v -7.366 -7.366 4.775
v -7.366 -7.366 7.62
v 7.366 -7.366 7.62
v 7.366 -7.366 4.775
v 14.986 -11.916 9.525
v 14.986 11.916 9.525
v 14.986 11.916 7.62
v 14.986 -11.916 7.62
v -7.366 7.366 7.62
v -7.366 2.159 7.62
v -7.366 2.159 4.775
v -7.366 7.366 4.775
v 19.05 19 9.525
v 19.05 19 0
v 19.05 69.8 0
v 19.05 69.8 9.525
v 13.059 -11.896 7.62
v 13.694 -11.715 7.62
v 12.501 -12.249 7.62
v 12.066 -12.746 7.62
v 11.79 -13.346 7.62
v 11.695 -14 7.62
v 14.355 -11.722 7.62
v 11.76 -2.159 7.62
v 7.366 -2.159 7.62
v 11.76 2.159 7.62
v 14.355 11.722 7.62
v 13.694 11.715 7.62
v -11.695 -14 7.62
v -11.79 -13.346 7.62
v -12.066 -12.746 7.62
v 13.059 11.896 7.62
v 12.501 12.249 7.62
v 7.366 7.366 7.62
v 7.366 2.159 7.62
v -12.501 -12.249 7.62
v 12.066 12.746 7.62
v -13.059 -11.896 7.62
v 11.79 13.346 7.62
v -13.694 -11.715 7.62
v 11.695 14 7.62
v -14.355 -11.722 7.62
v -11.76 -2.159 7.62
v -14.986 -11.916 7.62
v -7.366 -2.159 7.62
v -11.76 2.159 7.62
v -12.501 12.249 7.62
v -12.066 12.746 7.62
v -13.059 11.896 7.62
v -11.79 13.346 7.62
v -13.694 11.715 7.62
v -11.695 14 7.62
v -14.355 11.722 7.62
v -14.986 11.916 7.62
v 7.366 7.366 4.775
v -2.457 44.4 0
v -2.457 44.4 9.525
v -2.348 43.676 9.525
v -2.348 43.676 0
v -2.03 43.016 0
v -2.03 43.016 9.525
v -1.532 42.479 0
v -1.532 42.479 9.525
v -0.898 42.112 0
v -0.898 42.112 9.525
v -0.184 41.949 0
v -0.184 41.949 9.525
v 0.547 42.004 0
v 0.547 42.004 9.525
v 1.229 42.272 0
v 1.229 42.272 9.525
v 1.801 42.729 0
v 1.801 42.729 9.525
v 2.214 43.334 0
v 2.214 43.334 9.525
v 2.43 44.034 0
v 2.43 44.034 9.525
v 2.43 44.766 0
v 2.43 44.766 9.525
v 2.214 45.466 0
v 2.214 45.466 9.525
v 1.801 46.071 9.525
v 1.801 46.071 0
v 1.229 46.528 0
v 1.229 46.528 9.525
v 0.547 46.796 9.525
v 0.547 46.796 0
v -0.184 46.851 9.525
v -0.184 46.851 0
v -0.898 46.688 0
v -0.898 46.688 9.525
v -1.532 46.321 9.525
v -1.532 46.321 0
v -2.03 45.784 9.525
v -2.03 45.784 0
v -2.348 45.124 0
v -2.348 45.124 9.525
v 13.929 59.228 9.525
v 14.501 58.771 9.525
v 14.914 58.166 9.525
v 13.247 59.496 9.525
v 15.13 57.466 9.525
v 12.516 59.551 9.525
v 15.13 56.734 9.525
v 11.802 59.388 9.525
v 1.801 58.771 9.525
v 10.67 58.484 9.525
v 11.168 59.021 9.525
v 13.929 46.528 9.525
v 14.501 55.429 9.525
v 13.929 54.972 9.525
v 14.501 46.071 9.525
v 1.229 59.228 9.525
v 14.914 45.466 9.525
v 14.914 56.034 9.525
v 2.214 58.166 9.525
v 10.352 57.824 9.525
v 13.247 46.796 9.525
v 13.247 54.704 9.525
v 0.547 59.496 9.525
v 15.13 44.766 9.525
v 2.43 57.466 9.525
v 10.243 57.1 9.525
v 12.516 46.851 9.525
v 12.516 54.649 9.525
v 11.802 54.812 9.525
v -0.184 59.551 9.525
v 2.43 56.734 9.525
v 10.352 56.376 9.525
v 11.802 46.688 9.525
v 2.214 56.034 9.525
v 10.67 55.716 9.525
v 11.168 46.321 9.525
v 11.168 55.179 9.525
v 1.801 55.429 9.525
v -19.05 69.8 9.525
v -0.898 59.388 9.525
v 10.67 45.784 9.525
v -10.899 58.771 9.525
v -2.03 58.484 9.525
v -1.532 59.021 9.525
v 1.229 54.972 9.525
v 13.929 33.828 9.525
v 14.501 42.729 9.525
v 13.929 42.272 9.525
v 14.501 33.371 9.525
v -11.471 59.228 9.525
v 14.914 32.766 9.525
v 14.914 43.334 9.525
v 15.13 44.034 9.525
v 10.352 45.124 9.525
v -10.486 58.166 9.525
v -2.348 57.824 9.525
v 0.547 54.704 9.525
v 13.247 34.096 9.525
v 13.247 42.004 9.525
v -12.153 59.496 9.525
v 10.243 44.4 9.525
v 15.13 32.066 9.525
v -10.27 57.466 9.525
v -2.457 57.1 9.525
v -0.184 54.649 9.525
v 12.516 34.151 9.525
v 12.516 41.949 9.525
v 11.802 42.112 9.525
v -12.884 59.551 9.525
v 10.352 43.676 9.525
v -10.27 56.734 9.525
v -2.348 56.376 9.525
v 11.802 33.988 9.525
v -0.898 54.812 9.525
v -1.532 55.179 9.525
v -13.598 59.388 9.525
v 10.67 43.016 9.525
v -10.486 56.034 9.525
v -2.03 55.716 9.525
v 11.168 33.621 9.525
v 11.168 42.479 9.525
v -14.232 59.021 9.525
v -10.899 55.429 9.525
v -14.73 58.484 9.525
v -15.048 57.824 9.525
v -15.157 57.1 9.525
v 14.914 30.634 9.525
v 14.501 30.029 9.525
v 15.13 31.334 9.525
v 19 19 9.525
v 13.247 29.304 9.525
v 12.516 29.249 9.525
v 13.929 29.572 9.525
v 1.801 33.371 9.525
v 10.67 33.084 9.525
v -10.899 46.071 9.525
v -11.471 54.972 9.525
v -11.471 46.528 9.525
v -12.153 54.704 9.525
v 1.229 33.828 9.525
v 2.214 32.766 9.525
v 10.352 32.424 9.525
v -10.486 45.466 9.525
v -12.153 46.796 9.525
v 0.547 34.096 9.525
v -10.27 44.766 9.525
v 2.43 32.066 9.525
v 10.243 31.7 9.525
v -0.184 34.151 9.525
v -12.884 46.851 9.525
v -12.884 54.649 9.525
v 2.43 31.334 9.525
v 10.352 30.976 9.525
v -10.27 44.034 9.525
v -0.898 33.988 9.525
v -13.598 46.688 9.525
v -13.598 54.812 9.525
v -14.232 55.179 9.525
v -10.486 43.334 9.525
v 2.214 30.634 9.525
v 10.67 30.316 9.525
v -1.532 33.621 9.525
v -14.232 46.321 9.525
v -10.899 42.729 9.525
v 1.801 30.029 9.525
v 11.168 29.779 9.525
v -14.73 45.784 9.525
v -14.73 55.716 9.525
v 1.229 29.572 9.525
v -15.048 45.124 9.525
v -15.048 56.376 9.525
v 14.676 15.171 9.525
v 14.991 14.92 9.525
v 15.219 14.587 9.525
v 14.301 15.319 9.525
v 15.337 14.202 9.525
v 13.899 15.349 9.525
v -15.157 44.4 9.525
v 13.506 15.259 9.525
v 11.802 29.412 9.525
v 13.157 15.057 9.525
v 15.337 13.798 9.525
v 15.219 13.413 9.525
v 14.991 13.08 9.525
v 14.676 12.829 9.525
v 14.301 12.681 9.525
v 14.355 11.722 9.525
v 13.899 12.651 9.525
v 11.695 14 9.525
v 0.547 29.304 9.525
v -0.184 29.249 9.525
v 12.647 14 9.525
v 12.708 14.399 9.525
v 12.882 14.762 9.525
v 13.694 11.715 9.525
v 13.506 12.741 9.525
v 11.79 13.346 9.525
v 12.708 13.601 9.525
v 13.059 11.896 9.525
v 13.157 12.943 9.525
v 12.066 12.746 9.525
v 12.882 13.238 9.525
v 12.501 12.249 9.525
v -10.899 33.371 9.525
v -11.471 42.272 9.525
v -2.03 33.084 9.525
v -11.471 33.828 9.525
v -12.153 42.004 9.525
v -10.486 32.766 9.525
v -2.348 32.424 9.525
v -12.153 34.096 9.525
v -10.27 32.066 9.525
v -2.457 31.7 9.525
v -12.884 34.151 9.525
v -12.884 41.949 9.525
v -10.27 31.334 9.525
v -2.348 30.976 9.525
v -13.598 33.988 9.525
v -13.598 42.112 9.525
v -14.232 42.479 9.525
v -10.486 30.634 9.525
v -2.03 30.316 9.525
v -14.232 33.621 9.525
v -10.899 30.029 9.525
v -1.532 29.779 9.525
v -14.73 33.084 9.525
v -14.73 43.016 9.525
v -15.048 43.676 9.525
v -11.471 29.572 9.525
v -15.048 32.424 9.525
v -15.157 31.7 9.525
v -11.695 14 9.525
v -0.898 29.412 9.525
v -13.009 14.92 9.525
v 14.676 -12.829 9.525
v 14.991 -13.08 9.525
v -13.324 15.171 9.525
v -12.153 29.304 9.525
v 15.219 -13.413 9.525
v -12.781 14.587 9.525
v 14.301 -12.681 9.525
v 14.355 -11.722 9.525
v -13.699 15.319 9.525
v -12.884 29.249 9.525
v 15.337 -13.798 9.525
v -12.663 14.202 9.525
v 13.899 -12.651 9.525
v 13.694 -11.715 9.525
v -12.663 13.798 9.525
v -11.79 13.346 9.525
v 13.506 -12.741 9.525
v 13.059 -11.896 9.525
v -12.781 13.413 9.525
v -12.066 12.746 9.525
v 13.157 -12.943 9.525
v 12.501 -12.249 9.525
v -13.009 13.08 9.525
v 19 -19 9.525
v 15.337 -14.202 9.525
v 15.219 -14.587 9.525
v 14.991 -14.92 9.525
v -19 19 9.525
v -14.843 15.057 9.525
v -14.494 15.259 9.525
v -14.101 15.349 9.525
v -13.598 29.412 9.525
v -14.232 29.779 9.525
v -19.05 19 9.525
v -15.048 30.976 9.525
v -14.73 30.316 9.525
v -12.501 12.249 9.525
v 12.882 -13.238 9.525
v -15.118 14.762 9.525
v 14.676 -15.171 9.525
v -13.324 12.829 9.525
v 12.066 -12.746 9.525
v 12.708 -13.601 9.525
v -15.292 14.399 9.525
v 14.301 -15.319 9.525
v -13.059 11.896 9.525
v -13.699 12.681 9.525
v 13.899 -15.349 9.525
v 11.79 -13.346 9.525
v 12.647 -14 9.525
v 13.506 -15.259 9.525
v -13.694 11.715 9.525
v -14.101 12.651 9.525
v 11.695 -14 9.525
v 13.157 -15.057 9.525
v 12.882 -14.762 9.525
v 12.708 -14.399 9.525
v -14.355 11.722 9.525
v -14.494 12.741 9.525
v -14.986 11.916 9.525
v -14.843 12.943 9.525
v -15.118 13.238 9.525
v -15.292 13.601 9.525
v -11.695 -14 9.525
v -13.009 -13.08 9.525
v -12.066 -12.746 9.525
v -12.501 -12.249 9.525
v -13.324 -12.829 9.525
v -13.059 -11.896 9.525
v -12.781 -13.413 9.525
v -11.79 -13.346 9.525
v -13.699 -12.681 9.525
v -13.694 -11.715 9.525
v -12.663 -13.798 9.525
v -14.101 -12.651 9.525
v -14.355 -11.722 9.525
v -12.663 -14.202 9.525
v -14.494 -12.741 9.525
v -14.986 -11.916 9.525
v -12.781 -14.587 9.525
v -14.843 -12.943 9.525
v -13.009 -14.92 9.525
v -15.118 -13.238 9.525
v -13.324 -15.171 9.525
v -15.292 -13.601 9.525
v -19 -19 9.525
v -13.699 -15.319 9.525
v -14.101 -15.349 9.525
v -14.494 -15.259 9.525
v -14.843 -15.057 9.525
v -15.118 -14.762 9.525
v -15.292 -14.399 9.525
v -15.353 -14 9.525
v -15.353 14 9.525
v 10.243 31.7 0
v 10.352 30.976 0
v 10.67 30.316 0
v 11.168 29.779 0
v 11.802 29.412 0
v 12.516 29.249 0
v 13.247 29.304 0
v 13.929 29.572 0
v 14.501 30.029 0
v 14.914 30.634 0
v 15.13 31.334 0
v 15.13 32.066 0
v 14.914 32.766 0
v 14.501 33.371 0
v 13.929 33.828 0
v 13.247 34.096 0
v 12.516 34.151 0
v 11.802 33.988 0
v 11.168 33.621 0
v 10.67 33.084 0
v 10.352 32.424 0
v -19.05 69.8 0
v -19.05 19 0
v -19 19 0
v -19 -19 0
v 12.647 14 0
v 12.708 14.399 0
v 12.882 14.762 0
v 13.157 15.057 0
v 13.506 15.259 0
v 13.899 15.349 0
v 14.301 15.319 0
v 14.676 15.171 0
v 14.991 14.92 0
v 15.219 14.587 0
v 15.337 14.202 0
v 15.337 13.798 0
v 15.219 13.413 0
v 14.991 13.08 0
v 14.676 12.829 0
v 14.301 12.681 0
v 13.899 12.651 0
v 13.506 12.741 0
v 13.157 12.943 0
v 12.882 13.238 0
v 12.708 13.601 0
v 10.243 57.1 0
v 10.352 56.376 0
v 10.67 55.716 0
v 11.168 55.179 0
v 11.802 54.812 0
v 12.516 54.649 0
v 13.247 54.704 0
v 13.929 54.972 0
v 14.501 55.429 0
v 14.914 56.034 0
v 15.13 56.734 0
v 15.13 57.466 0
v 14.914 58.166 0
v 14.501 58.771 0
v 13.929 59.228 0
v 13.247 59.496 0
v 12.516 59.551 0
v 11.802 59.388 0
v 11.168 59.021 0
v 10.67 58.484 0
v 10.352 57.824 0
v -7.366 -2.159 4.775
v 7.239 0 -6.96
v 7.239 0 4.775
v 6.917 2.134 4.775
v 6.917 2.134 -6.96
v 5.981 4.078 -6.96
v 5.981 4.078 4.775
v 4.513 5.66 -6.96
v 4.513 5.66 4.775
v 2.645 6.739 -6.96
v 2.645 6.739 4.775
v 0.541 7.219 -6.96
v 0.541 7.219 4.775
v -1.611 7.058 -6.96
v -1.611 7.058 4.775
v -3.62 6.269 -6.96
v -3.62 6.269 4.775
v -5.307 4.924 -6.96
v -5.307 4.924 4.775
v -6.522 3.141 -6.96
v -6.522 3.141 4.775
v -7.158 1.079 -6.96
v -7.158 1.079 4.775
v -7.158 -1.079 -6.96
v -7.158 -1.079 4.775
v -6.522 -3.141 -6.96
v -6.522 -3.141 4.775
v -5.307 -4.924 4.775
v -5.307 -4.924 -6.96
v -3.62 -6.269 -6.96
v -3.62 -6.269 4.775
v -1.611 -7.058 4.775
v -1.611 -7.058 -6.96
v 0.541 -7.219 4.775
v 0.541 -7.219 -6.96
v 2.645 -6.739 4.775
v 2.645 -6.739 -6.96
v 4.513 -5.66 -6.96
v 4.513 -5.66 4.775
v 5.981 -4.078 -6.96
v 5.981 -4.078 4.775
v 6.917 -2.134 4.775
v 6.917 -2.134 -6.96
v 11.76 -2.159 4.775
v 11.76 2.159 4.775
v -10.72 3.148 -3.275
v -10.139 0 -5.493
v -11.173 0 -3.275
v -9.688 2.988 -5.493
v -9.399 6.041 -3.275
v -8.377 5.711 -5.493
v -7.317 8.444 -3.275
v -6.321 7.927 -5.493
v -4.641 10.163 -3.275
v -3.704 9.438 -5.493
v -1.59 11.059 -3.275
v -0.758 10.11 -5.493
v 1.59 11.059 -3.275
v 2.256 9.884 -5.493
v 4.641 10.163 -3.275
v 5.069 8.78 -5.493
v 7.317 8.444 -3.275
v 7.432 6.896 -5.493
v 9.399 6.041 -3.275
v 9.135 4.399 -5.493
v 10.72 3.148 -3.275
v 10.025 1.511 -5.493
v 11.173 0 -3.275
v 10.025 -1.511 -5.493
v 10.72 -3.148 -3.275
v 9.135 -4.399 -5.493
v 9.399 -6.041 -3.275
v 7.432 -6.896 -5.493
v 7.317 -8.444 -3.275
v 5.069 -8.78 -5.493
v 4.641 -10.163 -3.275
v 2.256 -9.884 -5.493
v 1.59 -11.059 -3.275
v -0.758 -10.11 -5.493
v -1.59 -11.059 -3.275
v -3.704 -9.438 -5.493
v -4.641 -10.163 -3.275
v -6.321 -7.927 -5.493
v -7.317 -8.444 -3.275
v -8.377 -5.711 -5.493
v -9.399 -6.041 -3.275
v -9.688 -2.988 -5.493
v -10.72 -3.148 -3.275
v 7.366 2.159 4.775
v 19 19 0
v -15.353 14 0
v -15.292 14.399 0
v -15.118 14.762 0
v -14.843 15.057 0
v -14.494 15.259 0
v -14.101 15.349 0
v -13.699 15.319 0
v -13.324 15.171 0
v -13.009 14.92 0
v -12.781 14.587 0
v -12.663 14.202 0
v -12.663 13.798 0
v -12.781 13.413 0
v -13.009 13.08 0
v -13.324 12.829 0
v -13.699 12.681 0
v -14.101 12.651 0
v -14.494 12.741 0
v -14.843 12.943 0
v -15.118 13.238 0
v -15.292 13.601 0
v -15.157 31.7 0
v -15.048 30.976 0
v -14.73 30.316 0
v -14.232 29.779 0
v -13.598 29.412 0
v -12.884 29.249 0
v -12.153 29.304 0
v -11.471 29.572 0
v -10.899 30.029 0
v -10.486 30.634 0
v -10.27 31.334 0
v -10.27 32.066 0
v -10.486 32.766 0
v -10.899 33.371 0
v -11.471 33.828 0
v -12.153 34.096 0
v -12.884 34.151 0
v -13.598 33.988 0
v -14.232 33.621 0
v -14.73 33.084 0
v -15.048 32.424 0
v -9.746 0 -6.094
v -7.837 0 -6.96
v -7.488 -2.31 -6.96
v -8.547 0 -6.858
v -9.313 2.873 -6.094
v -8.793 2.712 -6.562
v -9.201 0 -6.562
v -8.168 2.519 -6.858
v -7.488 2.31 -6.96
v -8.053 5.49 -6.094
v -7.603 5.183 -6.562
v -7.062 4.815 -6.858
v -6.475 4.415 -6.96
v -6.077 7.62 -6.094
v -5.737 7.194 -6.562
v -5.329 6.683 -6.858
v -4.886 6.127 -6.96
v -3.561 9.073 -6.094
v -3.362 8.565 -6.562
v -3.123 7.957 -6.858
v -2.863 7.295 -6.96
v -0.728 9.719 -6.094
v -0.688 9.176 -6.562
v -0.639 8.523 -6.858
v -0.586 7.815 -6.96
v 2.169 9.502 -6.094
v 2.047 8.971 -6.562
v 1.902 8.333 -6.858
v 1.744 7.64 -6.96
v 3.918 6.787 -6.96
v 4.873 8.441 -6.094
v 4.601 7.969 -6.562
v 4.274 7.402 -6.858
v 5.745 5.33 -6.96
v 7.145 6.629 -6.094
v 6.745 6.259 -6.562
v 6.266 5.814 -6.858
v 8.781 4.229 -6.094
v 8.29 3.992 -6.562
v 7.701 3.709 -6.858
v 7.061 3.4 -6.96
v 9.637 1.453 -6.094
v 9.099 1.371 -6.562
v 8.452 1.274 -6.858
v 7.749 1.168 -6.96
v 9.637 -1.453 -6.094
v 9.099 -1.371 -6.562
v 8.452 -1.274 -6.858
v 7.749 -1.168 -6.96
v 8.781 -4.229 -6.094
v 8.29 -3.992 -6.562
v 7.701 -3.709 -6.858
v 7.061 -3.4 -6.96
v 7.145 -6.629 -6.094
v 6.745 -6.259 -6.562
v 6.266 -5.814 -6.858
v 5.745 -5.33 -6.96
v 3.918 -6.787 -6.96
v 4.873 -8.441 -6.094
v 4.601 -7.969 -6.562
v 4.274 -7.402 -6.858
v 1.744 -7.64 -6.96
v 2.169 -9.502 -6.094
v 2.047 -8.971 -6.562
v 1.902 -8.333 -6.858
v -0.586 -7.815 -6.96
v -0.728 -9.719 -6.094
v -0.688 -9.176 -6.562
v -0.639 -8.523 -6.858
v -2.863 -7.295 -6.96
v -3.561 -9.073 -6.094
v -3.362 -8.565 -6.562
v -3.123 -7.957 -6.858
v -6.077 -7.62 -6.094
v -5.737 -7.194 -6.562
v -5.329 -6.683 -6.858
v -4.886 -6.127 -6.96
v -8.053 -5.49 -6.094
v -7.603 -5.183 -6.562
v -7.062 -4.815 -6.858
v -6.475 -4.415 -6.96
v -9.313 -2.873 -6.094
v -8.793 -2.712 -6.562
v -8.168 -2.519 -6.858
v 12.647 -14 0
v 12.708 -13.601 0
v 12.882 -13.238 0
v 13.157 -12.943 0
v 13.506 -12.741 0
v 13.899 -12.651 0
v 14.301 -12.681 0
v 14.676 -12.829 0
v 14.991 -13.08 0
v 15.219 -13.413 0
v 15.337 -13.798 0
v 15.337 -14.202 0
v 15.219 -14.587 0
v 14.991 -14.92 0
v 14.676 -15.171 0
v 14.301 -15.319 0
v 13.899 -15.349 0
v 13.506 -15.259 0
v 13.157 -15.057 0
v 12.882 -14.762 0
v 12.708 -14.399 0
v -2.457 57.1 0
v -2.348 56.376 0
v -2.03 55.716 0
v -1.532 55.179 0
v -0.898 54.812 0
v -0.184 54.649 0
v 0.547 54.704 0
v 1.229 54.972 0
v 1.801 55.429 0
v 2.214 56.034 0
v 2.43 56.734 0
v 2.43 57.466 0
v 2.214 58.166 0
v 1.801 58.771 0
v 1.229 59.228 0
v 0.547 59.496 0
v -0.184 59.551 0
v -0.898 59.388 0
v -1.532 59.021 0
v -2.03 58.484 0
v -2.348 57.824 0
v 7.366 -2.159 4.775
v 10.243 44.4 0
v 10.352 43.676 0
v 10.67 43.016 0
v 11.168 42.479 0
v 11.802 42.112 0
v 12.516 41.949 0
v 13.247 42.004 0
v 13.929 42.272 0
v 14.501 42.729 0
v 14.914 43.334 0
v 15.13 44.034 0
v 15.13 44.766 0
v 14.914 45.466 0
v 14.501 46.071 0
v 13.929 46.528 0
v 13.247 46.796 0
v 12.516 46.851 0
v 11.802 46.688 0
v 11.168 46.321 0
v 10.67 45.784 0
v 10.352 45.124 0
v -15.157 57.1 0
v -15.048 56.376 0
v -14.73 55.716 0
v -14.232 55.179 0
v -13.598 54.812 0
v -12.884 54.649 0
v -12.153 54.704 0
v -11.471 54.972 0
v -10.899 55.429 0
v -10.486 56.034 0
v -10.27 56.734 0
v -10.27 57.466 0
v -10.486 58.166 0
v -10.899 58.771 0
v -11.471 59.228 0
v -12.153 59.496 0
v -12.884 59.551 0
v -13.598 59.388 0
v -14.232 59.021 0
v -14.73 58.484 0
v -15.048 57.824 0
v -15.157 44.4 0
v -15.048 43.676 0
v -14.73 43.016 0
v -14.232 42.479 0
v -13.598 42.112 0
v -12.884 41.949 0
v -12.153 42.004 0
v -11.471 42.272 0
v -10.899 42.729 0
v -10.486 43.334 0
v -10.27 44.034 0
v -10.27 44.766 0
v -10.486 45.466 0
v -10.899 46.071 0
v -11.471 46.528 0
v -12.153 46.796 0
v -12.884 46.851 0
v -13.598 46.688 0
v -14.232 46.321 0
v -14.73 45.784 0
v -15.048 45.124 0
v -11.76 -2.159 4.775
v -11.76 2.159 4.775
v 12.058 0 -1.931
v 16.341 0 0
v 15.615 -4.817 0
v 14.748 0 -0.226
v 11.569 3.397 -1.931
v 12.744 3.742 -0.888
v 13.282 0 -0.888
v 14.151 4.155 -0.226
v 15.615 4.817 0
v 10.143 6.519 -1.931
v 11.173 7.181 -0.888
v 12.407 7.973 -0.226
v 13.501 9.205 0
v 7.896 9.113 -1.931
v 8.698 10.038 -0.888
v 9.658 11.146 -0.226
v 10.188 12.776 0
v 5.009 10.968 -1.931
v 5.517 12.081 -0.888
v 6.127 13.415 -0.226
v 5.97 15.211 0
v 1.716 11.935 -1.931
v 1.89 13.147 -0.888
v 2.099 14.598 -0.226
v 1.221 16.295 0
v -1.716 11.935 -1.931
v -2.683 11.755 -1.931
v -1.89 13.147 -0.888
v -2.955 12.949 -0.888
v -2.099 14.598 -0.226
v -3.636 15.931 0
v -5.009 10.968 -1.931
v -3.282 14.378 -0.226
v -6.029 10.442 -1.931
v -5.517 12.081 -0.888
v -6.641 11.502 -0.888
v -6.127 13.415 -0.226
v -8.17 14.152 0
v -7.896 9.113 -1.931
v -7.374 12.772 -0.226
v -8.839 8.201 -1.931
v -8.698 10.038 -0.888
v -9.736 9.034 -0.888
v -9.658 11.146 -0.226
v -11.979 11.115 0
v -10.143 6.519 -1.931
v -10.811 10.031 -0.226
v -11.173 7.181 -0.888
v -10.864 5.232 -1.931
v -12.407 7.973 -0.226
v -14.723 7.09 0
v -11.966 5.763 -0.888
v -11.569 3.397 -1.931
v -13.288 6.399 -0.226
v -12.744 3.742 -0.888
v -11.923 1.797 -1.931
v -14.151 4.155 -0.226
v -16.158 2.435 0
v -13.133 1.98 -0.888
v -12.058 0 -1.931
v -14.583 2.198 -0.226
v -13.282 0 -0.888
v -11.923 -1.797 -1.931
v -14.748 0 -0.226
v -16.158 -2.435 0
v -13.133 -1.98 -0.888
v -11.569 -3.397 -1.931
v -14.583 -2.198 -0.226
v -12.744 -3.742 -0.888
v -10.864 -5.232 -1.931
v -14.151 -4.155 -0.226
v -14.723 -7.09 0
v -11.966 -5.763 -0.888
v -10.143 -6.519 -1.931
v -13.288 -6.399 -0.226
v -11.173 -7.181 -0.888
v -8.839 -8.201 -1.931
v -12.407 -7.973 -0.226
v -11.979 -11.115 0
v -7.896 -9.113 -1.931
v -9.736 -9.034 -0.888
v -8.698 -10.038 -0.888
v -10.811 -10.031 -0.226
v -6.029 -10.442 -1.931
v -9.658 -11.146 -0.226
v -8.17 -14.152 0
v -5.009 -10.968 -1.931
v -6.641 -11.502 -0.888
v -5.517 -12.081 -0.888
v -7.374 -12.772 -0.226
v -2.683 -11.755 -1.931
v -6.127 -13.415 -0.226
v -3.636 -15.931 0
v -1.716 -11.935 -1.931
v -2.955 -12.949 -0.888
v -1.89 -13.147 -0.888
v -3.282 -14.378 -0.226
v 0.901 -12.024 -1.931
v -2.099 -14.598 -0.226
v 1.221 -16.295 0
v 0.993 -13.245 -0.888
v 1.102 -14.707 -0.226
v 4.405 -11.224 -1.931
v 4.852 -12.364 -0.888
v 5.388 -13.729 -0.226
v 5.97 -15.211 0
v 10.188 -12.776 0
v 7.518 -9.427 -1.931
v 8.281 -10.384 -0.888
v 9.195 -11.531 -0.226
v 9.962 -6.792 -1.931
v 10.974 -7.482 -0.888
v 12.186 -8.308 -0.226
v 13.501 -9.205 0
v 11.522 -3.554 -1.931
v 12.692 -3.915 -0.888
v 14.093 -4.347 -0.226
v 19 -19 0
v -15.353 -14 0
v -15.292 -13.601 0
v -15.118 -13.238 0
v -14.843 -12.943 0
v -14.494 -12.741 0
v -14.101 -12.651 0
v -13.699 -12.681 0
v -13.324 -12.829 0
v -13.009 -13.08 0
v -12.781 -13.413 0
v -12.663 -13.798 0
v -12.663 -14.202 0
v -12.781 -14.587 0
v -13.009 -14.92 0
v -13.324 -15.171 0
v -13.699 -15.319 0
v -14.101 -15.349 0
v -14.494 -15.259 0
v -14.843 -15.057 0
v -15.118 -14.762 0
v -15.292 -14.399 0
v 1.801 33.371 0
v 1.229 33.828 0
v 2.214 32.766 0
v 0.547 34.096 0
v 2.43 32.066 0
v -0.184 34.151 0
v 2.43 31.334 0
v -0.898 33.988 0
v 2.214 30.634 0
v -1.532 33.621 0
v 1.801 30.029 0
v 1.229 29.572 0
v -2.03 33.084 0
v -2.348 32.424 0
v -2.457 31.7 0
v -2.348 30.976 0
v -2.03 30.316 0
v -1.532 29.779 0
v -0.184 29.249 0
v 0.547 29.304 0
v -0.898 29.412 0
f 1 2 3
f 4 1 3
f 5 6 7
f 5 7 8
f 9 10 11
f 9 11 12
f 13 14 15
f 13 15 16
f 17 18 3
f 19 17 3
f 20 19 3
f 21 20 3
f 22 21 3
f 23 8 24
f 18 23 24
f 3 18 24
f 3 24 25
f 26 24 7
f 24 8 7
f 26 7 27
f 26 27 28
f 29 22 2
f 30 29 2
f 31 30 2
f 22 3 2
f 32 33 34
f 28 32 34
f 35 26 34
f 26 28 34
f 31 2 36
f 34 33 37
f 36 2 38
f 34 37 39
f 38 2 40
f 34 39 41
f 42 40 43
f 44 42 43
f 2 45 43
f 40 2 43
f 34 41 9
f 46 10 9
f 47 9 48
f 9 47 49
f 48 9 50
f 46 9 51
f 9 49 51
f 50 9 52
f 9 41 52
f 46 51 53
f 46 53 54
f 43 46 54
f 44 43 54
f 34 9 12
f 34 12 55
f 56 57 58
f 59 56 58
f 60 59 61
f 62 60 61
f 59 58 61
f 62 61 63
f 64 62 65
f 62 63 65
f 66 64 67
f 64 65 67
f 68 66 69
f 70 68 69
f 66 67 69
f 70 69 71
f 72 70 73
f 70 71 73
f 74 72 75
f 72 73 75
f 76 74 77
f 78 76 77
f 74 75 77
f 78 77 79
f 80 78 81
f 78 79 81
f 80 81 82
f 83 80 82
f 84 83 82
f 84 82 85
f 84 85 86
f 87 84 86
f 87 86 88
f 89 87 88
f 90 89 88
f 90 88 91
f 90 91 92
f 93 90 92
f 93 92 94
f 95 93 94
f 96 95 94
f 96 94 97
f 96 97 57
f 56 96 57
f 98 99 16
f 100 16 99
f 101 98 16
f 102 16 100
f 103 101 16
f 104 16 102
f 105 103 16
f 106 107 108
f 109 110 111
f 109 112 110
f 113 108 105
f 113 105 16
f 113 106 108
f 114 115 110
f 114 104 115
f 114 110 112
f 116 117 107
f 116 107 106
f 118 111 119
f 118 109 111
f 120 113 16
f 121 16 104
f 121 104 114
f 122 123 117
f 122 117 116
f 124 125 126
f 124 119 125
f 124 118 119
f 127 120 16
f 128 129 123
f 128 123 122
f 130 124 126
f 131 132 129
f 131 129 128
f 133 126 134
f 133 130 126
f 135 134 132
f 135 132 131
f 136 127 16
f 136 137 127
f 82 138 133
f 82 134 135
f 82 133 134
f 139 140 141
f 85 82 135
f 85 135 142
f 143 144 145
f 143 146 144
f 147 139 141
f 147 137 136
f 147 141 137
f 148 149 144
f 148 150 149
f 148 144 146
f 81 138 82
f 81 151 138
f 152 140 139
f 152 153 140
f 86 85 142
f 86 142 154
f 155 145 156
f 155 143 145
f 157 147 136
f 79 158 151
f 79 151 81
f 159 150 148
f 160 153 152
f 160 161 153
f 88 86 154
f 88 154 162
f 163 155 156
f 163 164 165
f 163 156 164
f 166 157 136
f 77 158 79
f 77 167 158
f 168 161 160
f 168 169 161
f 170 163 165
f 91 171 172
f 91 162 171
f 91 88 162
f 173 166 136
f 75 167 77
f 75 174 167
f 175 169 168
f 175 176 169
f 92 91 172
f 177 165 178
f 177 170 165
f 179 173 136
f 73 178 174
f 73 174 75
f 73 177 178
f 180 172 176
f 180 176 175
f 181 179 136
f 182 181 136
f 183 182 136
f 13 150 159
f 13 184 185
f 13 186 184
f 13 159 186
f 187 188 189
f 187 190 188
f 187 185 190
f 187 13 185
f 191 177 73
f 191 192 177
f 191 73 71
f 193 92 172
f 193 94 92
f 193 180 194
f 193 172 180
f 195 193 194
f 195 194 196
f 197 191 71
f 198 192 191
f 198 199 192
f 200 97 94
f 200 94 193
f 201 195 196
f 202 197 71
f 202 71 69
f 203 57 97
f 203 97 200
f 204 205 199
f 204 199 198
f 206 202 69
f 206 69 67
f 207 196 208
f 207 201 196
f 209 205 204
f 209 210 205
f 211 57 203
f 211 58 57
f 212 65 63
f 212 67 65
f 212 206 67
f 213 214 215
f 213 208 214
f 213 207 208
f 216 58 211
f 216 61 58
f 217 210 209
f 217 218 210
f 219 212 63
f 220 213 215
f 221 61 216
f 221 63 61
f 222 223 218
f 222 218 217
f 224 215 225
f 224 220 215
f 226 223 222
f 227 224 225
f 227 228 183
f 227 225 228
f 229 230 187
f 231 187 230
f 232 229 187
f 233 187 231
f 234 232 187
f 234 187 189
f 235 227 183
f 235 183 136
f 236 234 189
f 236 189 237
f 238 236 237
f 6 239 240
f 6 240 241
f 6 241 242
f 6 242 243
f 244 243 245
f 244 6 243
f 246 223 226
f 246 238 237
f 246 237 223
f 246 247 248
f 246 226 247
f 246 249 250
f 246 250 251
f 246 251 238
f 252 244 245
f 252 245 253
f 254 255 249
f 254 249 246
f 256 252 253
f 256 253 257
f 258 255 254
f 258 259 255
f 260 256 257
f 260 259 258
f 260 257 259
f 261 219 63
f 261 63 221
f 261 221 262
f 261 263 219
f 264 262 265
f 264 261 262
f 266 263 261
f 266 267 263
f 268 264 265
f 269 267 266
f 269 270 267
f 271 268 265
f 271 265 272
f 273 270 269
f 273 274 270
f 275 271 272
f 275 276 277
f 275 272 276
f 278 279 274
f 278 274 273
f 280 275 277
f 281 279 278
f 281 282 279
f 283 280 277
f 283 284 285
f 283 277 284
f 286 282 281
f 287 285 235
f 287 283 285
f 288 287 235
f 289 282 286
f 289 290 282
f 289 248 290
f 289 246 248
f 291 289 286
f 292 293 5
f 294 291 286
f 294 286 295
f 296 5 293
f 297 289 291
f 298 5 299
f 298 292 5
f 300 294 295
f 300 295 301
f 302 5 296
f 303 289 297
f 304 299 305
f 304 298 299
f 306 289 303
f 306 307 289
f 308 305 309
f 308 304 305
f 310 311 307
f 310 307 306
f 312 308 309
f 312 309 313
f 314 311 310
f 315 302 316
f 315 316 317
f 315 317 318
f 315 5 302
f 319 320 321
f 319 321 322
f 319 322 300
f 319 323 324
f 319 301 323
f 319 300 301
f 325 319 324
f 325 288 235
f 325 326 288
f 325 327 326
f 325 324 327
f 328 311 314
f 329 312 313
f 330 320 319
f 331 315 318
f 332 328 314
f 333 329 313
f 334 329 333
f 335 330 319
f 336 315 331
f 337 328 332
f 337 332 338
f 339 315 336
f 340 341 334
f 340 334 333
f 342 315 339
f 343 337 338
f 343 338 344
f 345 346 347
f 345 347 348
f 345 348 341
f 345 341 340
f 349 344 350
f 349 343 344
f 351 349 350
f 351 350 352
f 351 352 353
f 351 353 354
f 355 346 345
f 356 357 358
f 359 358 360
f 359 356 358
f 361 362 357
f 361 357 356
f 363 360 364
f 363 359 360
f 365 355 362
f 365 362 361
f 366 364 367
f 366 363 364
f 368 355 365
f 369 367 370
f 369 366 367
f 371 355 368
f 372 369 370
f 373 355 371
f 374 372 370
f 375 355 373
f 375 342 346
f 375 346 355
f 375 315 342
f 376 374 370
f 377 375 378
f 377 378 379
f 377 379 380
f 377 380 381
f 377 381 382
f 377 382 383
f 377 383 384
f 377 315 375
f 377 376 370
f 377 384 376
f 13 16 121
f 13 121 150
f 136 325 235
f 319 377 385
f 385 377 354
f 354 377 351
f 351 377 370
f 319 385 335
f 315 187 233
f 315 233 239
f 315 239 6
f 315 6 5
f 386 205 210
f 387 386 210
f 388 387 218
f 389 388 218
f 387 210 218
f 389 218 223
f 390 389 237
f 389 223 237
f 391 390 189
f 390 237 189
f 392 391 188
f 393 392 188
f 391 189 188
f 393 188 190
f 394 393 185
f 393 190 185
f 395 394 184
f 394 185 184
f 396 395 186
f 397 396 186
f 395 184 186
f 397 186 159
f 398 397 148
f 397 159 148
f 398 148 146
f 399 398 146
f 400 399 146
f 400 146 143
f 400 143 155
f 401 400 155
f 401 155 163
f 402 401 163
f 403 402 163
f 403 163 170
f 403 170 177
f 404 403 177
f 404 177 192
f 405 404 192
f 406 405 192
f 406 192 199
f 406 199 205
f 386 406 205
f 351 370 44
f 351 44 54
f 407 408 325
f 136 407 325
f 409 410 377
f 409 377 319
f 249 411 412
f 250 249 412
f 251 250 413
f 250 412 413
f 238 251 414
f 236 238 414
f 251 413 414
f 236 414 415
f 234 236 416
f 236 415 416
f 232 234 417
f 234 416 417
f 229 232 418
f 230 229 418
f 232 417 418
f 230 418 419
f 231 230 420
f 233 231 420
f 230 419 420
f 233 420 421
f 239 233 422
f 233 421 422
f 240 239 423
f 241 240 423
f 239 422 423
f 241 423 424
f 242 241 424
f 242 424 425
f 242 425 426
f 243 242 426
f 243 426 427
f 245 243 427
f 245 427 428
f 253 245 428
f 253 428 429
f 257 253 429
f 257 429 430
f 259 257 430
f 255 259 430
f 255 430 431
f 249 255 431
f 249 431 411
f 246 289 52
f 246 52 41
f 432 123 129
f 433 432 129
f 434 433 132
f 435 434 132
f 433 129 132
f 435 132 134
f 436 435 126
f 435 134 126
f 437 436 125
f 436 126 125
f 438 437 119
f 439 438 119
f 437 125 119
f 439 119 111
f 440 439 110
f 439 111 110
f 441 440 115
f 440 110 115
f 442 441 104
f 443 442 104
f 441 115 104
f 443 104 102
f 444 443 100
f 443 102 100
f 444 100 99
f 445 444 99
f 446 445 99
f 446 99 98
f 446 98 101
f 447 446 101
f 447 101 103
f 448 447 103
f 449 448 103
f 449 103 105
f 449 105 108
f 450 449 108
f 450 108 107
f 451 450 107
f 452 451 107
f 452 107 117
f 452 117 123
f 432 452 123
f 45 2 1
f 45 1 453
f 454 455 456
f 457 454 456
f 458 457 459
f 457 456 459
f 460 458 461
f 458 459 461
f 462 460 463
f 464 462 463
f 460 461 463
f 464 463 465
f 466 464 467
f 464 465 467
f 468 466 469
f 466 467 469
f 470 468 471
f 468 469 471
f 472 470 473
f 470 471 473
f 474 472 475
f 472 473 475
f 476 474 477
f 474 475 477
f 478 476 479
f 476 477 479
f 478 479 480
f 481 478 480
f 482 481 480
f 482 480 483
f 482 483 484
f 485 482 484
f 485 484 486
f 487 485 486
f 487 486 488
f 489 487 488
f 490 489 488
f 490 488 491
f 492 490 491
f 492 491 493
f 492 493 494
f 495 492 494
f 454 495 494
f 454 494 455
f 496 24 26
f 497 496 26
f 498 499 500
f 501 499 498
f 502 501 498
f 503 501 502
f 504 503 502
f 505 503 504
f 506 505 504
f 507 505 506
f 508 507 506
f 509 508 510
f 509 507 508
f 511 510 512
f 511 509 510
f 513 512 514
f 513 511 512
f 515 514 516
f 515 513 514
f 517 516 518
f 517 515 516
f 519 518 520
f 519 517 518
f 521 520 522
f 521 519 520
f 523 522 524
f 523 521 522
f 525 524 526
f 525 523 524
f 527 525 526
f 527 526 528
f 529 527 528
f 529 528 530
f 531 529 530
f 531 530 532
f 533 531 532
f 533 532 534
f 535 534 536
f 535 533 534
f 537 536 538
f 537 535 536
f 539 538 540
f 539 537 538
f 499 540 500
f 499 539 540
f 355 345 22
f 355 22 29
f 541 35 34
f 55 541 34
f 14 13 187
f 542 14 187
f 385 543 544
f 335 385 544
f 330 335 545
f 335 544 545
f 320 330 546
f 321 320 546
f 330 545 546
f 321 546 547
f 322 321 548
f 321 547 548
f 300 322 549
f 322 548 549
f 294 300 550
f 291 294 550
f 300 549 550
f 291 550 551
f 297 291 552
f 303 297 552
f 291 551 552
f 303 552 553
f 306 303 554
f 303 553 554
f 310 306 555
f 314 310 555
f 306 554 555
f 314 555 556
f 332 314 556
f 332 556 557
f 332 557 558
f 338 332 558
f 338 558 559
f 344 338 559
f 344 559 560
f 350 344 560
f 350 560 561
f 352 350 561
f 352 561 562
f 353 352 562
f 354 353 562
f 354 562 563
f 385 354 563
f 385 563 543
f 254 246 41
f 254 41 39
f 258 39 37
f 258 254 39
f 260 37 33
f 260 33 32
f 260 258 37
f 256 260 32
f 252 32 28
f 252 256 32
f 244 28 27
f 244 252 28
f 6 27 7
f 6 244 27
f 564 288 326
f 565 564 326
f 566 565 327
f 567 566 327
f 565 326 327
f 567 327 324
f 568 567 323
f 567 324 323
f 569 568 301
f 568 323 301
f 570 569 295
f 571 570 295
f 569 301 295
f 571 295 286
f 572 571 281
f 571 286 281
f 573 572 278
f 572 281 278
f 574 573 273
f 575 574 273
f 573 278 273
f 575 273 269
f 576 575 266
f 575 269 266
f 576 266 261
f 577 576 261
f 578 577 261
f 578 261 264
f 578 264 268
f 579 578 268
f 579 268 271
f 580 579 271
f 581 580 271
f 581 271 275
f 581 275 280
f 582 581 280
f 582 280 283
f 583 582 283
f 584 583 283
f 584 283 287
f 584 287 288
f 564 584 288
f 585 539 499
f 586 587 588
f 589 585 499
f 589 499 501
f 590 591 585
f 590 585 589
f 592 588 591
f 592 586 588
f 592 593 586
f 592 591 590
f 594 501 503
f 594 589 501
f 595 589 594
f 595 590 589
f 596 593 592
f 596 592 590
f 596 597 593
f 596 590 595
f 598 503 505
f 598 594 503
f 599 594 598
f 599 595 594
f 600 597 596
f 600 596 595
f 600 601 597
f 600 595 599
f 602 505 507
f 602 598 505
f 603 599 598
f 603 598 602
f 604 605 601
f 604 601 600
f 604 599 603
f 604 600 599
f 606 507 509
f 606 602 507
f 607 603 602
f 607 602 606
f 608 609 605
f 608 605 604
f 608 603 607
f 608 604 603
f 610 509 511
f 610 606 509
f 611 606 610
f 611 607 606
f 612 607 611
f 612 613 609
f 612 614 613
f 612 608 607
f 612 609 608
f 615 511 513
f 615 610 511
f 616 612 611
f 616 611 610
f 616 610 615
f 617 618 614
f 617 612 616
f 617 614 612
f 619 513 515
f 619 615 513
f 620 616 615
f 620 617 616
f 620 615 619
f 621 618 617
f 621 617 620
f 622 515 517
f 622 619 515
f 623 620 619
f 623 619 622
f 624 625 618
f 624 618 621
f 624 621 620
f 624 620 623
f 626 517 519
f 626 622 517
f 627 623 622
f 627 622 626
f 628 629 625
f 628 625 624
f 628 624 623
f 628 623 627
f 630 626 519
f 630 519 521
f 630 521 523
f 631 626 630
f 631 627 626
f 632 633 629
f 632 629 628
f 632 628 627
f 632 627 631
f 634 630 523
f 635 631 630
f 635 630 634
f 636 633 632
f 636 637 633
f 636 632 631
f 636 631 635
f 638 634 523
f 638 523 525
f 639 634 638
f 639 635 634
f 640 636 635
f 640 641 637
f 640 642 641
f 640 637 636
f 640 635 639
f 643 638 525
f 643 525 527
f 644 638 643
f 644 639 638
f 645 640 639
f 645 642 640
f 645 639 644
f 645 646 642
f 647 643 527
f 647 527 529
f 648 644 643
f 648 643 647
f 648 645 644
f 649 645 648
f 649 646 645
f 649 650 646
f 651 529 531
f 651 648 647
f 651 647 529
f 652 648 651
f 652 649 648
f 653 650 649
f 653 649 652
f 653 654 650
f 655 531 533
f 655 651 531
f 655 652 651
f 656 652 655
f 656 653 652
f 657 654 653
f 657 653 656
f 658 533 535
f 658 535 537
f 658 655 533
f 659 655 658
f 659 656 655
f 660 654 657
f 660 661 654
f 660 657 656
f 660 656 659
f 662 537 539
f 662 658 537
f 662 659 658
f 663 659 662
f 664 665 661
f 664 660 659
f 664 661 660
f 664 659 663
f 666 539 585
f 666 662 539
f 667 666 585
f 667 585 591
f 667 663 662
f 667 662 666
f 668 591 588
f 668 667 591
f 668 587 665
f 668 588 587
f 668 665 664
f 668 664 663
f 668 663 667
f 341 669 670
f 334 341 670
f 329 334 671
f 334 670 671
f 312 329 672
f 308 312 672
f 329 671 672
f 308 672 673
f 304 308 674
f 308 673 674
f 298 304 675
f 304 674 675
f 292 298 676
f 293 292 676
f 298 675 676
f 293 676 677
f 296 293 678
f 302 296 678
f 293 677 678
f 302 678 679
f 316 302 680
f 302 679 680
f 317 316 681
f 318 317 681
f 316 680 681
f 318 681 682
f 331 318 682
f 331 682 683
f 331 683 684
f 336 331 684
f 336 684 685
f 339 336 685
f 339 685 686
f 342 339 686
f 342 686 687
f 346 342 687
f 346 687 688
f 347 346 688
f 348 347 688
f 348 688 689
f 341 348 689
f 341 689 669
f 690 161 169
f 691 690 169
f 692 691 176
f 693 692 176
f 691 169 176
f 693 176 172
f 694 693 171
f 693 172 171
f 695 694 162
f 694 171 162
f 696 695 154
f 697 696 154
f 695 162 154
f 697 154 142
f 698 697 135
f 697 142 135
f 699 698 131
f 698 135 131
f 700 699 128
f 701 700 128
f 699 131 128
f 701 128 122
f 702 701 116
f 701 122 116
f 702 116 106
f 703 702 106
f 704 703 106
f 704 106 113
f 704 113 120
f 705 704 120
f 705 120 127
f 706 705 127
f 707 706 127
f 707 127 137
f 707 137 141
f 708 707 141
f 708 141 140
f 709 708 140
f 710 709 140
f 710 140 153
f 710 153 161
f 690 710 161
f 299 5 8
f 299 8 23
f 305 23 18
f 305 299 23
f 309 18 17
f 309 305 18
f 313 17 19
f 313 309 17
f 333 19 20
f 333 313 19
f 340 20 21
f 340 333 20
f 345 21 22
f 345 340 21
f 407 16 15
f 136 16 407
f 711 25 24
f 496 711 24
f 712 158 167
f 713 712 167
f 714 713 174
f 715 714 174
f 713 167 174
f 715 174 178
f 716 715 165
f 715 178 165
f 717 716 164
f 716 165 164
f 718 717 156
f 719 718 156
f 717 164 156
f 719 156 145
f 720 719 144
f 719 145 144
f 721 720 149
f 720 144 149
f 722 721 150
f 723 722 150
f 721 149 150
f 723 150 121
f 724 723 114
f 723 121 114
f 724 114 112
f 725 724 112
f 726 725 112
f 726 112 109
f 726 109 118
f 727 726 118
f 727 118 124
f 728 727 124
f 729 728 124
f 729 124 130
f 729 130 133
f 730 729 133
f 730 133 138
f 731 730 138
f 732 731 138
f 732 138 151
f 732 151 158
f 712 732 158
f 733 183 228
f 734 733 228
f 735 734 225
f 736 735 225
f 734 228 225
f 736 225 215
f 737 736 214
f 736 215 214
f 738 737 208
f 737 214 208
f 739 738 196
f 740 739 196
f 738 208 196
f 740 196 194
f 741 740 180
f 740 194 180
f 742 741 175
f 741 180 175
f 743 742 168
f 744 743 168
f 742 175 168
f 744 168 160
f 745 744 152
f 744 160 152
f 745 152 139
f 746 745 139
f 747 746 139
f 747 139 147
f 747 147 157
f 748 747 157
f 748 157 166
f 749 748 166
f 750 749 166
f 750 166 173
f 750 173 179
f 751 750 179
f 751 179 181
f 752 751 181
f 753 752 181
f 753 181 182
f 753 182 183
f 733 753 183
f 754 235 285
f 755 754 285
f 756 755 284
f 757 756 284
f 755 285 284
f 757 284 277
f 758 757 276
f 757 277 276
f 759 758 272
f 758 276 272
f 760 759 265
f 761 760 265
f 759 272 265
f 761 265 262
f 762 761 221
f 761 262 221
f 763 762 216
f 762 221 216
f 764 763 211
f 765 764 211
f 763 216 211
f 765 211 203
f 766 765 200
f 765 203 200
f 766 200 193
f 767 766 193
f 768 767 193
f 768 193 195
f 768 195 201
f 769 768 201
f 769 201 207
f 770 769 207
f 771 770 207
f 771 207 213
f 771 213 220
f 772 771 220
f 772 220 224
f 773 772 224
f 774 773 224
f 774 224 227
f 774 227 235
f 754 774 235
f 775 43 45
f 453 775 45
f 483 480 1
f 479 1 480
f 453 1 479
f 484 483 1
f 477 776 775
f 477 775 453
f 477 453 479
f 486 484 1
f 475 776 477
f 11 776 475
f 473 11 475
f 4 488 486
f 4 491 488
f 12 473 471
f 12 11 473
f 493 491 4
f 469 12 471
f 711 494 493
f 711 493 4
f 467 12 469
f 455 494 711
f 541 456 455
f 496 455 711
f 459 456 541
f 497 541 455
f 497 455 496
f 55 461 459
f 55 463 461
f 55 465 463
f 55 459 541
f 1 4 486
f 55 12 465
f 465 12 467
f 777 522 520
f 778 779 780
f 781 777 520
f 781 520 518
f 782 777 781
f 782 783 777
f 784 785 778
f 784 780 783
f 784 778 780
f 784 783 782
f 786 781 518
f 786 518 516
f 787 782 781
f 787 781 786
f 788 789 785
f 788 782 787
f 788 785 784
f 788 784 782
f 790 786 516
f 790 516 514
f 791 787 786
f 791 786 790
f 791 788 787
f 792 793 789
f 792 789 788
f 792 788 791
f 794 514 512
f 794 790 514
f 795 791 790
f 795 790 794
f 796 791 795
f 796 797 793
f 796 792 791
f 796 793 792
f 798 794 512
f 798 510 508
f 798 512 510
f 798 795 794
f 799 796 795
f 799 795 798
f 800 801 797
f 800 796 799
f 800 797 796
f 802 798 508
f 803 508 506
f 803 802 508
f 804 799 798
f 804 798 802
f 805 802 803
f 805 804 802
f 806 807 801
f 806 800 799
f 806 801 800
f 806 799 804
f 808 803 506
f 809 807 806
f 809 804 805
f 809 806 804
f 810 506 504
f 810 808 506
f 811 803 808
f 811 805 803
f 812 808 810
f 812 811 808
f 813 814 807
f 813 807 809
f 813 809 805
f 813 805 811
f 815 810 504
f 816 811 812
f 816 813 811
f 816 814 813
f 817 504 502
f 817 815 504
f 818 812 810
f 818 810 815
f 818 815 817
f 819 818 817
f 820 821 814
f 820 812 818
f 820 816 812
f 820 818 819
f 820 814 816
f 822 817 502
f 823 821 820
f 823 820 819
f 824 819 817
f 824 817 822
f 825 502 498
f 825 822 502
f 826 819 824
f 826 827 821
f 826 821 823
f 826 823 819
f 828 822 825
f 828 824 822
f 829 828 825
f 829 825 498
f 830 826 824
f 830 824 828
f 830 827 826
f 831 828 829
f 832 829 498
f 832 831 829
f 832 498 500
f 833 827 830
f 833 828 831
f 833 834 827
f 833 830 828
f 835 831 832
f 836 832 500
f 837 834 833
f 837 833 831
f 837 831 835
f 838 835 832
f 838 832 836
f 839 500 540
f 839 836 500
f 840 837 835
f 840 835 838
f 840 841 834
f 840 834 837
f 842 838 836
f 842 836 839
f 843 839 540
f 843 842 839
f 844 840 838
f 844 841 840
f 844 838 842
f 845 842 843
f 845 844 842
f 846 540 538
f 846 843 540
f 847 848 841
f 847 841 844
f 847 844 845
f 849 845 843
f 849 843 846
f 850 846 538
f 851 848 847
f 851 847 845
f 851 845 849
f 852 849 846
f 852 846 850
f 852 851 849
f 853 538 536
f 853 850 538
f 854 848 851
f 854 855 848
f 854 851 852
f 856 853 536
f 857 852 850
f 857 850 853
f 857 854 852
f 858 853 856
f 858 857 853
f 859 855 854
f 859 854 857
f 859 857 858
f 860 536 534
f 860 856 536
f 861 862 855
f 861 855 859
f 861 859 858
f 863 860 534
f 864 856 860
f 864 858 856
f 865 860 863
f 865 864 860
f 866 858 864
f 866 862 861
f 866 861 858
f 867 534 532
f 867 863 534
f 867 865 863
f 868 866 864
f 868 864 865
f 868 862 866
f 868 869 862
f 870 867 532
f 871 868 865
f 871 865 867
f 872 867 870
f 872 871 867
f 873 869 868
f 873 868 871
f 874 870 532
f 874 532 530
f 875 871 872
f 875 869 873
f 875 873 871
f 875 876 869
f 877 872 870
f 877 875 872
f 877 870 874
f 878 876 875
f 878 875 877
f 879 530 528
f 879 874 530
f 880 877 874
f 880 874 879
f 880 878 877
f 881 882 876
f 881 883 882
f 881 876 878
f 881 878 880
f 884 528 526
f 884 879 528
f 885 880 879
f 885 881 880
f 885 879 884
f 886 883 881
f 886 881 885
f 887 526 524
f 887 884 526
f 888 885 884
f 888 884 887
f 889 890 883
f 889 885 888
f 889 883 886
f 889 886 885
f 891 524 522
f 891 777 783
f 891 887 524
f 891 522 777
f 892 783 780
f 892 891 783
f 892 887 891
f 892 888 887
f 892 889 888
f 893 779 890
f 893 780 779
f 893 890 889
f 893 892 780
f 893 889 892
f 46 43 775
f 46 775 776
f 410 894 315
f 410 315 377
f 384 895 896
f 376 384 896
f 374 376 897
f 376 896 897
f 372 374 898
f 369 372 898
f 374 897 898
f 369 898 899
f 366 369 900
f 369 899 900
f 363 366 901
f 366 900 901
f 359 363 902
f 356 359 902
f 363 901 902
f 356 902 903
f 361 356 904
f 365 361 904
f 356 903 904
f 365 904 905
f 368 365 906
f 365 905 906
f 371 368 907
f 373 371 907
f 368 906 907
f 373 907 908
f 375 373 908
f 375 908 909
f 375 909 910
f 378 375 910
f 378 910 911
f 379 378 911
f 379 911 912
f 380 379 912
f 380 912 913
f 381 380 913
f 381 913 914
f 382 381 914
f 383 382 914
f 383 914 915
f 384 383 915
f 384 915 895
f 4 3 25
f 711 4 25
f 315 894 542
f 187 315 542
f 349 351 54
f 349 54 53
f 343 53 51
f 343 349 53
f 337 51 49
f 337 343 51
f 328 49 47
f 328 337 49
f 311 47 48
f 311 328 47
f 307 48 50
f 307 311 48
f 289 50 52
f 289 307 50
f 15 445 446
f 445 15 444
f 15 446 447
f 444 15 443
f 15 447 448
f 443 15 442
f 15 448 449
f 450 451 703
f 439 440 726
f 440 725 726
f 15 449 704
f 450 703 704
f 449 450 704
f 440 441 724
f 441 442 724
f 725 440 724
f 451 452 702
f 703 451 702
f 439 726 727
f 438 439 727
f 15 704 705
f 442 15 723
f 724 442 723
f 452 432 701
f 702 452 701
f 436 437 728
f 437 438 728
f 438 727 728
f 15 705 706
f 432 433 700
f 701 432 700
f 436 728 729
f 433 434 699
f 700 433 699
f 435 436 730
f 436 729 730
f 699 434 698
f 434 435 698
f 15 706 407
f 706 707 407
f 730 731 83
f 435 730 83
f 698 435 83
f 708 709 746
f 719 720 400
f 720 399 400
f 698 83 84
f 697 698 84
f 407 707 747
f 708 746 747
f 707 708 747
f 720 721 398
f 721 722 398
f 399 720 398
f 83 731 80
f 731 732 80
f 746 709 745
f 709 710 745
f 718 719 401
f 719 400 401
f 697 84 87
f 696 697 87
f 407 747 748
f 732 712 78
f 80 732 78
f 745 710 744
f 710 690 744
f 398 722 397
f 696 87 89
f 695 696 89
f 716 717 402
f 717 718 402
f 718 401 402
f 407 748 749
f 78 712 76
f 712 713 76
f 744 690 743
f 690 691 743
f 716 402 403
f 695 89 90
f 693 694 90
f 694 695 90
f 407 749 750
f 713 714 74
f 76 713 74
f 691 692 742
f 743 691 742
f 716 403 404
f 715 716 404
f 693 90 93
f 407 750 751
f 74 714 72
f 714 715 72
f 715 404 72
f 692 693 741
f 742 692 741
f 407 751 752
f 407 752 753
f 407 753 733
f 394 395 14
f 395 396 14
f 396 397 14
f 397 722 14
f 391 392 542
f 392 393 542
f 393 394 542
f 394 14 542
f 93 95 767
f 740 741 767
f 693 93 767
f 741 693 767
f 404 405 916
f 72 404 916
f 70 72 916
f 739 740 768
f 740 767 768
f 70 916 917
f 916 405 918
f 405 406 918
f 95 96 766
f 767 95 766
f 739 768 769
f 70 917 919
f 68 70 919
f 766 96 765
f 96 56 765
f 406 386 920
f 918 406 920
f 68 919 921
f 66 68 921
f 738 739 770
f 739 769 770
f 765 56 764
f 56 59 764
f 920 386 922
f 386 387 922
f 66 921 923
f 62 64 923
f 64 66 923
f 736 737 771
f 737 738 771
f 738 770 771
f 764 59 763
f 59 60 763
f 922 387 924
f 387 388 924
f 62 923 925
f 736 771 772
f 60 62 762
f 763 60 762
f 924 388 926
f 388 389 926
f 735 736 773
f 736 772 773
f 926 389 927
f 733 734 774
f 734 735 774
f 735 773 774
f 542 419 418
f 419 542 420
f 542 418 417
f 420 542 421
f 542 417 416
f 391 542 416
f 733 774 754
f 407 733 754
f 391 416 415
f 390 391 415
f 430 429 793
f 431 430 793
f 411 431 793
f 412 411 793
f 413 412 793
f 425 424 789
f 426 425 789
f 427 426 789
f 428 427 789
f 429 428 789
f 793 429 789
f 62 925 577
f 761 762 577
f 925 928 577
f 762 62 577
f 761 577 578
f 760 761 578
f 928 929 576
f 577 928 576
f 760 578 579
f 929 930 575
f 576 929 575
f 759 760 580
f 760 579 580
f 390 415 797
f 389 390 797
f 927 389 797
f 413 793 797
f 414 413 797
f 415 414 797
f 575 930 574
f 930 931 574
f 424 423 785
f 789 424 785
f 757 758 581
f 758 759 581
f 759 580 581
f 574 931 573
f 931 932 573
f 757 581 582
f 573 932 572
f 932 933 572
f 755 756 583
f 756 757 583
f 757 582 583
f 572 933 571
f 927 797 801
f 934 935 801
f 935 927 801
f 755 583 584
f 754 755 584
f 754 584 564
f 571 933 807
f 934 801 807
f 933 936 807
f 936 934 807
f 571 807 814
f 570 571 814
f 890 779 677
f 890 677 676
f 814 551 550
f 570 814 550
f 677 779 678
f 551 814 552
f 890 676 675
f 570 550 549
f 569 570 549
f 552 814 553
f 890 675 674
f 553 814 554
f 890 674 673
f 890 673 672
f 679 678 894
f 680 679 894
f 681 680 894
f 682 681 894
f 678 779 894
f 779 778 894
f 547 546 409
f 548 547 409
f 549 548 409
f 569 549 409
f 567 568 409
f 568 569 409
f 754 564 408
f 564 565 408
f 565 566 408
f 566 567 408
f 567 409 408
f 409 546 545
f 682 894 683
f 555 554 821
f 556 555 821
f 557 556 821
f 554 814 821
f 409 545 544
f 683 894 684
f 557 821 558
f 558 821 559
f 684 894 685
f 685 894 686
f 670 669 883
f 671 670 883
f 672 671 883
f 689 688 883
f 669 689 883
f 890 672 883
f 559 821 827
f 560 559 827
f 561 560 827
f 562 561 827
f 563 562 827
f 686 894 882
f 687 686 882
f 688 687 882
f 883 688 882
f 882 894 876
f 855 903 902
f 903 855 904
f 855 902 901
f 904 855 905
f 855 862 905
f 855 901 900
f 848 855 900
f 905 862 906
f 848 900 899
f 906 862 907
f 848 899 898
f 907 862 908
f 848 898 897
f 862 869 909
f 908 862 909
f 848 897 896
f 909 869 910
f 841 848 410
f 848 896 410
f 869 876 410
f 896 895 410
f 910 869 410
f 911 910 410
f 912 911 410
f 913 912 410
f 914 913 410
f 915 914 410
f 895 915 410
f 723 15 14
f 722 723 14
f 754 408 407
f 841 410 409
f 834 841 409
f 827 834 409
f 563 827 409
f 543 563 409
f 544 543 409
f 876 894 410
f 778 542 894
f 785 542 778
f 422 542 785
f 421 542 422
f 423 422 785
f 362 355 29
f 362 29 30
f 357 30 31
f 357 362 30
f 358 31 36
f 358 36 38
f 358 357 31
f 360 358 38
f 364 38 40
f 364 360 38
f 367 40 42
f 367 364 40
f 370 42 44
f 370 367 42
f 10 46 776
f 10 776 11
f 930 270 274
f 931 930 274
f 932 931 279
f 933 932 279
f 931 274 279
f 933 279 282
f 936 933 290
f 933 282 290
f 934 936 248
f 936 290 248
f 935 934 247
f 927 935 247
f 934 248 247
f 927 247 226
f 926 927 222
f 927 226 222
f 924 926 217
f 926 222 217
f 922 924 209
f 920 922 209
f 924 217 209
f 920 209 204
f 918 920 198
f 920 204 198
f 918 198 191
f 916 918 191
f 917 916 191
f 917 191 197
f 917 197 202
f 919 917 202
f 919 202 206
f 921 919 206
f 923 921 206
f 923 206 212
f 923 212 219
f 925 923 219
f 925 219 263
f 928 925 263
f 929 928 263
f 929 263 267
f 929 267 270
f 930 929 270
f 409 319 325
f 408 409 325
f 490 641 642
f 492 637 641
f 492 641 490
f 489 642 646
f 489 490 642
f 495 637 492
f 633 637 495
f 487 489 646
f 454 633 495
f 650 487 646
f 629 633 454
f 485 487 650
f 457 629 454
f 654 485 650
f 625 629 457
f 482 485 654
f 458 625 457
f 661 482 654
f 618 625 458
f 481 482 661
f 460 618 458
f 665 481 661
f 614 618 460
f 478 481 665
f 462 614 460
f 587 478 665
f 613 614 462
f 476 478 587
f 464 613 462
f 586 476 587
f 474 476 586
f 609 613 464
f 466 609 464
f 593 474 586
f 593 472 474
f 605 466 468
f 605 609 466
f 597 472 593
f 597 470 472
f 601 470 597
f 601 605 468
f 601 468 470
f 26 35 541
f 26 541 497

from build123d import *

# Parameters (mm, degrees)
SKETCH1_W                    = 38
SKETCH1_H                    = 38
BOSS_EXTRUDE1_DEPTH          = 9.525
F_36_0_1065_DIAMETER_HOLE2_D = 2.7051
SKETCH8_W                    = 38.1
SKETCH8_H                    = 9.525
BOSS_EXTRUDE2_DEPTH          = 50.8
F_10_0_1935_DIAMETER_HOLE1_D = 4.9149
CUT_EXTRUDE2_DEPTH           = 1.905
CUT_EXTRUDE4_START           = 1.905
SKETCH13_W                   = 14.732
SKETCH13_H                   = 14.732
CUT_EXTRUDE4_DEPTH           = 4.7498
SKETCH14_W                   = 23.5204
SKETCH14_H                   = 4.318
CUT_EXTRUDE5_DEPTH           = 2.8448
SKETCH15_R                   = 12.7
BOSS_EXTRUDE3_DEPTH          = 6.9596
SKETCH12_R                   = 7.239
CUT_EXTRUDE3_DEPTH           = 74.807230243
CHAMFER1_SIZE2               = 3.245314778
CHAMFER1_SIZE                = 6.9596
FILLET4_R                    = 2.54
LPATTERN1_COUNT              = 3
LPATTERN1_PITCH              = 12.7


with BuildPart() as part:
    # Sketch1 → Boss-Extrude1 (new body)
    with BuildSketch(Plane(origin=(0, 0, 0), x_dir=(0, 1, 0), z_dir=(0, 0, 1))):
        Rectangle(SKETCH1_W, SKETCH1_H)
    extrude(amount=BOSS_EXTRUDE1_DEPTH)

    # #36 (0.1065) Diameter Hole2 (through all)
    with Locations(Plane.XY.offset(9.525)):
        with Locations((-14, -14), (14, -14), (14, 14), (-14, 14)):
            Hole(F_36_0_1065_DIAMETER_HOLE2_D / 2)

    # Sketch8 → Boss-Extrude2 (add)
    with BuildSketch(Plane(origin=(0, 19, 0), x_dir=(-1, 0, 0), z_dir=(0, 1, 0))):
        with Locations((0, 4.7625)):
            Rectangle(SKETCH8_W, SKETCH8_H)
    extrude(amount=BOSS_EXTRUDE2_DEPTH)

    # #10 (0.1935) Diameter Hole1 (through all)
    with Locations(Plane(origin=(0, 0, 0), x_dir=(1, 0, 0), z_dir=(0, 0, -1))):
        with Locations((-12.7, -57.1), (0, -57.1), (12.7, -57.1), (25.4, -57.1), (38.1, -57.1)):
            f_10_0_1935_diameter_hole1 = Hole(F_10_0_1935_DIAMETER_HOLE1_D / 2)

    # Sketch11 → Cut-Extrude2 (cut)
    with BuildSketch(Plane.XY.offset(9.525)):
        with BuildLine():
            Line((11.69495, -14), (-11.69495, -14))
            ThreePointArc((-11.69495, -14), (-12.76702064, -12.052432953), (-14.986, -11.916479061))
            Line((-14.986, -11.916479061), (-14.986, 11.916479061))
            ThreePointArc((-14.986, 11.916479061), (-12.76702064, 12.052432953), (-11.69495, 14))
            Line((-11.69495, 14), (11.69495, 14))
            ThreePointArc((11.69495, 14), (12.76702064, 12.052432953), (14.986, 11.916479061))
            Line((14.986, 11.916479061), (14.986, -11.916479061))
            ThreePointArc((14.986, -11.916479061), (12.76702064, -12.052432953), (11.69495, -14))
        make_face()
    extrude(amount=-CUT_EXTRUDE2_DEPTH, mode=Mode.SUBTRACT)

    # Sketch13 → Cut-Extrude4 (cut)
    with BuildSketch(Plane.XY.offset(7.62).offset(CUT_EXTRUDE4_START)):
        Rectangle(SKETCH13_W, SKETCH13_H)
    extrude(amount=-CUT_EXTRUDE4_DEPTH, mode=Mode.SUBTRACT)

    # Sketch14 → Cut-Extrude5 (cut)
    with BuildSketch(Plane.XY.offset(7.62)):
        Rectangle(SKETCH14_W, SKETCH14_H)
    extrude(amount=-CUT_EXTRUDE5_DEPTH, mode=Mode.SUBTRACT)

    # Sketch15 → Boss-Extrude3 (add)
    with BuildSketch(Plane(origin=(0, 0, 0), x_dir=(1, 0, 0), z_dir=(0, 0, -1))):
        with Locations(Location((0, 0, 0), (0, 0, 180))):
            Circle(SKETCH15_R)
    extrude(amount=BOSS_EXTRUDE3_DEPTH)

    # Sketch12 → Cut-Extrude3 (cut, through all)
    with BuildSketch(Plane.XY.offset(7.62)):
        Circle(SKETCH12_R)
    extrude(amount=-CUT_EXTRUDE3_DEPTH, mode=Mode.SUBTRACT)

    # Chamfer1
    chamfer1_edges = [part.edges().sort_by_distance(p)[0] for p in [
        (12.7, 0, -6.9596),
    ]]
    chamfer1_side = [part.faces().sort_by_distance(p)[0] for p in [
        (12.7, 0, -6.894693704),
    ]]
    chamfer(chamfer1_edges, length=CHAMFER1_SIZE - 0.0001, length2=CHAMFER1_SIZE2 - 0.0001, reference=chamfer1_side[0])  # a hair under: the kernel refuses the full size

    # Fillet3: read off the stored shape, not the designer's step
    # Fillet3 outline → Fillet3 (revolve)
    with BuildSketch(Plane.XZ):
        with BuildLine():
            Line((11.161307538, 0), (11.161307538, -3.299736634))
            ThreePointArc((11.161307538, -3.299736634), (13.270189279, -0.895017887), (16.340856541, 0))
            Line((16.340856541, 0), (11.161307538, 0))
        make_face()
    revolve(axis=Axis((0, 0, 0), (0, 0, 1)))

    # Fillet4
    fillet4_edges = [part.edges().sort_by_distance(p)[0] for p in [
        (9.454785222, 0, -6.9596),
    ]]
    fillet(fillet4_edges, radius=FILLET4_R)

    # LPattern1: #10 (0.1935) Diameter Hole1 ×3
    with Locations(*[(0, -i * LPATTERN1_PITCH, 0) for i in range(1, LPATTERN1_COUNT)]):
        add(f_10_0_1935_diameter_hole1, mode=Mode.SUBTRACT)


solid = part.part
